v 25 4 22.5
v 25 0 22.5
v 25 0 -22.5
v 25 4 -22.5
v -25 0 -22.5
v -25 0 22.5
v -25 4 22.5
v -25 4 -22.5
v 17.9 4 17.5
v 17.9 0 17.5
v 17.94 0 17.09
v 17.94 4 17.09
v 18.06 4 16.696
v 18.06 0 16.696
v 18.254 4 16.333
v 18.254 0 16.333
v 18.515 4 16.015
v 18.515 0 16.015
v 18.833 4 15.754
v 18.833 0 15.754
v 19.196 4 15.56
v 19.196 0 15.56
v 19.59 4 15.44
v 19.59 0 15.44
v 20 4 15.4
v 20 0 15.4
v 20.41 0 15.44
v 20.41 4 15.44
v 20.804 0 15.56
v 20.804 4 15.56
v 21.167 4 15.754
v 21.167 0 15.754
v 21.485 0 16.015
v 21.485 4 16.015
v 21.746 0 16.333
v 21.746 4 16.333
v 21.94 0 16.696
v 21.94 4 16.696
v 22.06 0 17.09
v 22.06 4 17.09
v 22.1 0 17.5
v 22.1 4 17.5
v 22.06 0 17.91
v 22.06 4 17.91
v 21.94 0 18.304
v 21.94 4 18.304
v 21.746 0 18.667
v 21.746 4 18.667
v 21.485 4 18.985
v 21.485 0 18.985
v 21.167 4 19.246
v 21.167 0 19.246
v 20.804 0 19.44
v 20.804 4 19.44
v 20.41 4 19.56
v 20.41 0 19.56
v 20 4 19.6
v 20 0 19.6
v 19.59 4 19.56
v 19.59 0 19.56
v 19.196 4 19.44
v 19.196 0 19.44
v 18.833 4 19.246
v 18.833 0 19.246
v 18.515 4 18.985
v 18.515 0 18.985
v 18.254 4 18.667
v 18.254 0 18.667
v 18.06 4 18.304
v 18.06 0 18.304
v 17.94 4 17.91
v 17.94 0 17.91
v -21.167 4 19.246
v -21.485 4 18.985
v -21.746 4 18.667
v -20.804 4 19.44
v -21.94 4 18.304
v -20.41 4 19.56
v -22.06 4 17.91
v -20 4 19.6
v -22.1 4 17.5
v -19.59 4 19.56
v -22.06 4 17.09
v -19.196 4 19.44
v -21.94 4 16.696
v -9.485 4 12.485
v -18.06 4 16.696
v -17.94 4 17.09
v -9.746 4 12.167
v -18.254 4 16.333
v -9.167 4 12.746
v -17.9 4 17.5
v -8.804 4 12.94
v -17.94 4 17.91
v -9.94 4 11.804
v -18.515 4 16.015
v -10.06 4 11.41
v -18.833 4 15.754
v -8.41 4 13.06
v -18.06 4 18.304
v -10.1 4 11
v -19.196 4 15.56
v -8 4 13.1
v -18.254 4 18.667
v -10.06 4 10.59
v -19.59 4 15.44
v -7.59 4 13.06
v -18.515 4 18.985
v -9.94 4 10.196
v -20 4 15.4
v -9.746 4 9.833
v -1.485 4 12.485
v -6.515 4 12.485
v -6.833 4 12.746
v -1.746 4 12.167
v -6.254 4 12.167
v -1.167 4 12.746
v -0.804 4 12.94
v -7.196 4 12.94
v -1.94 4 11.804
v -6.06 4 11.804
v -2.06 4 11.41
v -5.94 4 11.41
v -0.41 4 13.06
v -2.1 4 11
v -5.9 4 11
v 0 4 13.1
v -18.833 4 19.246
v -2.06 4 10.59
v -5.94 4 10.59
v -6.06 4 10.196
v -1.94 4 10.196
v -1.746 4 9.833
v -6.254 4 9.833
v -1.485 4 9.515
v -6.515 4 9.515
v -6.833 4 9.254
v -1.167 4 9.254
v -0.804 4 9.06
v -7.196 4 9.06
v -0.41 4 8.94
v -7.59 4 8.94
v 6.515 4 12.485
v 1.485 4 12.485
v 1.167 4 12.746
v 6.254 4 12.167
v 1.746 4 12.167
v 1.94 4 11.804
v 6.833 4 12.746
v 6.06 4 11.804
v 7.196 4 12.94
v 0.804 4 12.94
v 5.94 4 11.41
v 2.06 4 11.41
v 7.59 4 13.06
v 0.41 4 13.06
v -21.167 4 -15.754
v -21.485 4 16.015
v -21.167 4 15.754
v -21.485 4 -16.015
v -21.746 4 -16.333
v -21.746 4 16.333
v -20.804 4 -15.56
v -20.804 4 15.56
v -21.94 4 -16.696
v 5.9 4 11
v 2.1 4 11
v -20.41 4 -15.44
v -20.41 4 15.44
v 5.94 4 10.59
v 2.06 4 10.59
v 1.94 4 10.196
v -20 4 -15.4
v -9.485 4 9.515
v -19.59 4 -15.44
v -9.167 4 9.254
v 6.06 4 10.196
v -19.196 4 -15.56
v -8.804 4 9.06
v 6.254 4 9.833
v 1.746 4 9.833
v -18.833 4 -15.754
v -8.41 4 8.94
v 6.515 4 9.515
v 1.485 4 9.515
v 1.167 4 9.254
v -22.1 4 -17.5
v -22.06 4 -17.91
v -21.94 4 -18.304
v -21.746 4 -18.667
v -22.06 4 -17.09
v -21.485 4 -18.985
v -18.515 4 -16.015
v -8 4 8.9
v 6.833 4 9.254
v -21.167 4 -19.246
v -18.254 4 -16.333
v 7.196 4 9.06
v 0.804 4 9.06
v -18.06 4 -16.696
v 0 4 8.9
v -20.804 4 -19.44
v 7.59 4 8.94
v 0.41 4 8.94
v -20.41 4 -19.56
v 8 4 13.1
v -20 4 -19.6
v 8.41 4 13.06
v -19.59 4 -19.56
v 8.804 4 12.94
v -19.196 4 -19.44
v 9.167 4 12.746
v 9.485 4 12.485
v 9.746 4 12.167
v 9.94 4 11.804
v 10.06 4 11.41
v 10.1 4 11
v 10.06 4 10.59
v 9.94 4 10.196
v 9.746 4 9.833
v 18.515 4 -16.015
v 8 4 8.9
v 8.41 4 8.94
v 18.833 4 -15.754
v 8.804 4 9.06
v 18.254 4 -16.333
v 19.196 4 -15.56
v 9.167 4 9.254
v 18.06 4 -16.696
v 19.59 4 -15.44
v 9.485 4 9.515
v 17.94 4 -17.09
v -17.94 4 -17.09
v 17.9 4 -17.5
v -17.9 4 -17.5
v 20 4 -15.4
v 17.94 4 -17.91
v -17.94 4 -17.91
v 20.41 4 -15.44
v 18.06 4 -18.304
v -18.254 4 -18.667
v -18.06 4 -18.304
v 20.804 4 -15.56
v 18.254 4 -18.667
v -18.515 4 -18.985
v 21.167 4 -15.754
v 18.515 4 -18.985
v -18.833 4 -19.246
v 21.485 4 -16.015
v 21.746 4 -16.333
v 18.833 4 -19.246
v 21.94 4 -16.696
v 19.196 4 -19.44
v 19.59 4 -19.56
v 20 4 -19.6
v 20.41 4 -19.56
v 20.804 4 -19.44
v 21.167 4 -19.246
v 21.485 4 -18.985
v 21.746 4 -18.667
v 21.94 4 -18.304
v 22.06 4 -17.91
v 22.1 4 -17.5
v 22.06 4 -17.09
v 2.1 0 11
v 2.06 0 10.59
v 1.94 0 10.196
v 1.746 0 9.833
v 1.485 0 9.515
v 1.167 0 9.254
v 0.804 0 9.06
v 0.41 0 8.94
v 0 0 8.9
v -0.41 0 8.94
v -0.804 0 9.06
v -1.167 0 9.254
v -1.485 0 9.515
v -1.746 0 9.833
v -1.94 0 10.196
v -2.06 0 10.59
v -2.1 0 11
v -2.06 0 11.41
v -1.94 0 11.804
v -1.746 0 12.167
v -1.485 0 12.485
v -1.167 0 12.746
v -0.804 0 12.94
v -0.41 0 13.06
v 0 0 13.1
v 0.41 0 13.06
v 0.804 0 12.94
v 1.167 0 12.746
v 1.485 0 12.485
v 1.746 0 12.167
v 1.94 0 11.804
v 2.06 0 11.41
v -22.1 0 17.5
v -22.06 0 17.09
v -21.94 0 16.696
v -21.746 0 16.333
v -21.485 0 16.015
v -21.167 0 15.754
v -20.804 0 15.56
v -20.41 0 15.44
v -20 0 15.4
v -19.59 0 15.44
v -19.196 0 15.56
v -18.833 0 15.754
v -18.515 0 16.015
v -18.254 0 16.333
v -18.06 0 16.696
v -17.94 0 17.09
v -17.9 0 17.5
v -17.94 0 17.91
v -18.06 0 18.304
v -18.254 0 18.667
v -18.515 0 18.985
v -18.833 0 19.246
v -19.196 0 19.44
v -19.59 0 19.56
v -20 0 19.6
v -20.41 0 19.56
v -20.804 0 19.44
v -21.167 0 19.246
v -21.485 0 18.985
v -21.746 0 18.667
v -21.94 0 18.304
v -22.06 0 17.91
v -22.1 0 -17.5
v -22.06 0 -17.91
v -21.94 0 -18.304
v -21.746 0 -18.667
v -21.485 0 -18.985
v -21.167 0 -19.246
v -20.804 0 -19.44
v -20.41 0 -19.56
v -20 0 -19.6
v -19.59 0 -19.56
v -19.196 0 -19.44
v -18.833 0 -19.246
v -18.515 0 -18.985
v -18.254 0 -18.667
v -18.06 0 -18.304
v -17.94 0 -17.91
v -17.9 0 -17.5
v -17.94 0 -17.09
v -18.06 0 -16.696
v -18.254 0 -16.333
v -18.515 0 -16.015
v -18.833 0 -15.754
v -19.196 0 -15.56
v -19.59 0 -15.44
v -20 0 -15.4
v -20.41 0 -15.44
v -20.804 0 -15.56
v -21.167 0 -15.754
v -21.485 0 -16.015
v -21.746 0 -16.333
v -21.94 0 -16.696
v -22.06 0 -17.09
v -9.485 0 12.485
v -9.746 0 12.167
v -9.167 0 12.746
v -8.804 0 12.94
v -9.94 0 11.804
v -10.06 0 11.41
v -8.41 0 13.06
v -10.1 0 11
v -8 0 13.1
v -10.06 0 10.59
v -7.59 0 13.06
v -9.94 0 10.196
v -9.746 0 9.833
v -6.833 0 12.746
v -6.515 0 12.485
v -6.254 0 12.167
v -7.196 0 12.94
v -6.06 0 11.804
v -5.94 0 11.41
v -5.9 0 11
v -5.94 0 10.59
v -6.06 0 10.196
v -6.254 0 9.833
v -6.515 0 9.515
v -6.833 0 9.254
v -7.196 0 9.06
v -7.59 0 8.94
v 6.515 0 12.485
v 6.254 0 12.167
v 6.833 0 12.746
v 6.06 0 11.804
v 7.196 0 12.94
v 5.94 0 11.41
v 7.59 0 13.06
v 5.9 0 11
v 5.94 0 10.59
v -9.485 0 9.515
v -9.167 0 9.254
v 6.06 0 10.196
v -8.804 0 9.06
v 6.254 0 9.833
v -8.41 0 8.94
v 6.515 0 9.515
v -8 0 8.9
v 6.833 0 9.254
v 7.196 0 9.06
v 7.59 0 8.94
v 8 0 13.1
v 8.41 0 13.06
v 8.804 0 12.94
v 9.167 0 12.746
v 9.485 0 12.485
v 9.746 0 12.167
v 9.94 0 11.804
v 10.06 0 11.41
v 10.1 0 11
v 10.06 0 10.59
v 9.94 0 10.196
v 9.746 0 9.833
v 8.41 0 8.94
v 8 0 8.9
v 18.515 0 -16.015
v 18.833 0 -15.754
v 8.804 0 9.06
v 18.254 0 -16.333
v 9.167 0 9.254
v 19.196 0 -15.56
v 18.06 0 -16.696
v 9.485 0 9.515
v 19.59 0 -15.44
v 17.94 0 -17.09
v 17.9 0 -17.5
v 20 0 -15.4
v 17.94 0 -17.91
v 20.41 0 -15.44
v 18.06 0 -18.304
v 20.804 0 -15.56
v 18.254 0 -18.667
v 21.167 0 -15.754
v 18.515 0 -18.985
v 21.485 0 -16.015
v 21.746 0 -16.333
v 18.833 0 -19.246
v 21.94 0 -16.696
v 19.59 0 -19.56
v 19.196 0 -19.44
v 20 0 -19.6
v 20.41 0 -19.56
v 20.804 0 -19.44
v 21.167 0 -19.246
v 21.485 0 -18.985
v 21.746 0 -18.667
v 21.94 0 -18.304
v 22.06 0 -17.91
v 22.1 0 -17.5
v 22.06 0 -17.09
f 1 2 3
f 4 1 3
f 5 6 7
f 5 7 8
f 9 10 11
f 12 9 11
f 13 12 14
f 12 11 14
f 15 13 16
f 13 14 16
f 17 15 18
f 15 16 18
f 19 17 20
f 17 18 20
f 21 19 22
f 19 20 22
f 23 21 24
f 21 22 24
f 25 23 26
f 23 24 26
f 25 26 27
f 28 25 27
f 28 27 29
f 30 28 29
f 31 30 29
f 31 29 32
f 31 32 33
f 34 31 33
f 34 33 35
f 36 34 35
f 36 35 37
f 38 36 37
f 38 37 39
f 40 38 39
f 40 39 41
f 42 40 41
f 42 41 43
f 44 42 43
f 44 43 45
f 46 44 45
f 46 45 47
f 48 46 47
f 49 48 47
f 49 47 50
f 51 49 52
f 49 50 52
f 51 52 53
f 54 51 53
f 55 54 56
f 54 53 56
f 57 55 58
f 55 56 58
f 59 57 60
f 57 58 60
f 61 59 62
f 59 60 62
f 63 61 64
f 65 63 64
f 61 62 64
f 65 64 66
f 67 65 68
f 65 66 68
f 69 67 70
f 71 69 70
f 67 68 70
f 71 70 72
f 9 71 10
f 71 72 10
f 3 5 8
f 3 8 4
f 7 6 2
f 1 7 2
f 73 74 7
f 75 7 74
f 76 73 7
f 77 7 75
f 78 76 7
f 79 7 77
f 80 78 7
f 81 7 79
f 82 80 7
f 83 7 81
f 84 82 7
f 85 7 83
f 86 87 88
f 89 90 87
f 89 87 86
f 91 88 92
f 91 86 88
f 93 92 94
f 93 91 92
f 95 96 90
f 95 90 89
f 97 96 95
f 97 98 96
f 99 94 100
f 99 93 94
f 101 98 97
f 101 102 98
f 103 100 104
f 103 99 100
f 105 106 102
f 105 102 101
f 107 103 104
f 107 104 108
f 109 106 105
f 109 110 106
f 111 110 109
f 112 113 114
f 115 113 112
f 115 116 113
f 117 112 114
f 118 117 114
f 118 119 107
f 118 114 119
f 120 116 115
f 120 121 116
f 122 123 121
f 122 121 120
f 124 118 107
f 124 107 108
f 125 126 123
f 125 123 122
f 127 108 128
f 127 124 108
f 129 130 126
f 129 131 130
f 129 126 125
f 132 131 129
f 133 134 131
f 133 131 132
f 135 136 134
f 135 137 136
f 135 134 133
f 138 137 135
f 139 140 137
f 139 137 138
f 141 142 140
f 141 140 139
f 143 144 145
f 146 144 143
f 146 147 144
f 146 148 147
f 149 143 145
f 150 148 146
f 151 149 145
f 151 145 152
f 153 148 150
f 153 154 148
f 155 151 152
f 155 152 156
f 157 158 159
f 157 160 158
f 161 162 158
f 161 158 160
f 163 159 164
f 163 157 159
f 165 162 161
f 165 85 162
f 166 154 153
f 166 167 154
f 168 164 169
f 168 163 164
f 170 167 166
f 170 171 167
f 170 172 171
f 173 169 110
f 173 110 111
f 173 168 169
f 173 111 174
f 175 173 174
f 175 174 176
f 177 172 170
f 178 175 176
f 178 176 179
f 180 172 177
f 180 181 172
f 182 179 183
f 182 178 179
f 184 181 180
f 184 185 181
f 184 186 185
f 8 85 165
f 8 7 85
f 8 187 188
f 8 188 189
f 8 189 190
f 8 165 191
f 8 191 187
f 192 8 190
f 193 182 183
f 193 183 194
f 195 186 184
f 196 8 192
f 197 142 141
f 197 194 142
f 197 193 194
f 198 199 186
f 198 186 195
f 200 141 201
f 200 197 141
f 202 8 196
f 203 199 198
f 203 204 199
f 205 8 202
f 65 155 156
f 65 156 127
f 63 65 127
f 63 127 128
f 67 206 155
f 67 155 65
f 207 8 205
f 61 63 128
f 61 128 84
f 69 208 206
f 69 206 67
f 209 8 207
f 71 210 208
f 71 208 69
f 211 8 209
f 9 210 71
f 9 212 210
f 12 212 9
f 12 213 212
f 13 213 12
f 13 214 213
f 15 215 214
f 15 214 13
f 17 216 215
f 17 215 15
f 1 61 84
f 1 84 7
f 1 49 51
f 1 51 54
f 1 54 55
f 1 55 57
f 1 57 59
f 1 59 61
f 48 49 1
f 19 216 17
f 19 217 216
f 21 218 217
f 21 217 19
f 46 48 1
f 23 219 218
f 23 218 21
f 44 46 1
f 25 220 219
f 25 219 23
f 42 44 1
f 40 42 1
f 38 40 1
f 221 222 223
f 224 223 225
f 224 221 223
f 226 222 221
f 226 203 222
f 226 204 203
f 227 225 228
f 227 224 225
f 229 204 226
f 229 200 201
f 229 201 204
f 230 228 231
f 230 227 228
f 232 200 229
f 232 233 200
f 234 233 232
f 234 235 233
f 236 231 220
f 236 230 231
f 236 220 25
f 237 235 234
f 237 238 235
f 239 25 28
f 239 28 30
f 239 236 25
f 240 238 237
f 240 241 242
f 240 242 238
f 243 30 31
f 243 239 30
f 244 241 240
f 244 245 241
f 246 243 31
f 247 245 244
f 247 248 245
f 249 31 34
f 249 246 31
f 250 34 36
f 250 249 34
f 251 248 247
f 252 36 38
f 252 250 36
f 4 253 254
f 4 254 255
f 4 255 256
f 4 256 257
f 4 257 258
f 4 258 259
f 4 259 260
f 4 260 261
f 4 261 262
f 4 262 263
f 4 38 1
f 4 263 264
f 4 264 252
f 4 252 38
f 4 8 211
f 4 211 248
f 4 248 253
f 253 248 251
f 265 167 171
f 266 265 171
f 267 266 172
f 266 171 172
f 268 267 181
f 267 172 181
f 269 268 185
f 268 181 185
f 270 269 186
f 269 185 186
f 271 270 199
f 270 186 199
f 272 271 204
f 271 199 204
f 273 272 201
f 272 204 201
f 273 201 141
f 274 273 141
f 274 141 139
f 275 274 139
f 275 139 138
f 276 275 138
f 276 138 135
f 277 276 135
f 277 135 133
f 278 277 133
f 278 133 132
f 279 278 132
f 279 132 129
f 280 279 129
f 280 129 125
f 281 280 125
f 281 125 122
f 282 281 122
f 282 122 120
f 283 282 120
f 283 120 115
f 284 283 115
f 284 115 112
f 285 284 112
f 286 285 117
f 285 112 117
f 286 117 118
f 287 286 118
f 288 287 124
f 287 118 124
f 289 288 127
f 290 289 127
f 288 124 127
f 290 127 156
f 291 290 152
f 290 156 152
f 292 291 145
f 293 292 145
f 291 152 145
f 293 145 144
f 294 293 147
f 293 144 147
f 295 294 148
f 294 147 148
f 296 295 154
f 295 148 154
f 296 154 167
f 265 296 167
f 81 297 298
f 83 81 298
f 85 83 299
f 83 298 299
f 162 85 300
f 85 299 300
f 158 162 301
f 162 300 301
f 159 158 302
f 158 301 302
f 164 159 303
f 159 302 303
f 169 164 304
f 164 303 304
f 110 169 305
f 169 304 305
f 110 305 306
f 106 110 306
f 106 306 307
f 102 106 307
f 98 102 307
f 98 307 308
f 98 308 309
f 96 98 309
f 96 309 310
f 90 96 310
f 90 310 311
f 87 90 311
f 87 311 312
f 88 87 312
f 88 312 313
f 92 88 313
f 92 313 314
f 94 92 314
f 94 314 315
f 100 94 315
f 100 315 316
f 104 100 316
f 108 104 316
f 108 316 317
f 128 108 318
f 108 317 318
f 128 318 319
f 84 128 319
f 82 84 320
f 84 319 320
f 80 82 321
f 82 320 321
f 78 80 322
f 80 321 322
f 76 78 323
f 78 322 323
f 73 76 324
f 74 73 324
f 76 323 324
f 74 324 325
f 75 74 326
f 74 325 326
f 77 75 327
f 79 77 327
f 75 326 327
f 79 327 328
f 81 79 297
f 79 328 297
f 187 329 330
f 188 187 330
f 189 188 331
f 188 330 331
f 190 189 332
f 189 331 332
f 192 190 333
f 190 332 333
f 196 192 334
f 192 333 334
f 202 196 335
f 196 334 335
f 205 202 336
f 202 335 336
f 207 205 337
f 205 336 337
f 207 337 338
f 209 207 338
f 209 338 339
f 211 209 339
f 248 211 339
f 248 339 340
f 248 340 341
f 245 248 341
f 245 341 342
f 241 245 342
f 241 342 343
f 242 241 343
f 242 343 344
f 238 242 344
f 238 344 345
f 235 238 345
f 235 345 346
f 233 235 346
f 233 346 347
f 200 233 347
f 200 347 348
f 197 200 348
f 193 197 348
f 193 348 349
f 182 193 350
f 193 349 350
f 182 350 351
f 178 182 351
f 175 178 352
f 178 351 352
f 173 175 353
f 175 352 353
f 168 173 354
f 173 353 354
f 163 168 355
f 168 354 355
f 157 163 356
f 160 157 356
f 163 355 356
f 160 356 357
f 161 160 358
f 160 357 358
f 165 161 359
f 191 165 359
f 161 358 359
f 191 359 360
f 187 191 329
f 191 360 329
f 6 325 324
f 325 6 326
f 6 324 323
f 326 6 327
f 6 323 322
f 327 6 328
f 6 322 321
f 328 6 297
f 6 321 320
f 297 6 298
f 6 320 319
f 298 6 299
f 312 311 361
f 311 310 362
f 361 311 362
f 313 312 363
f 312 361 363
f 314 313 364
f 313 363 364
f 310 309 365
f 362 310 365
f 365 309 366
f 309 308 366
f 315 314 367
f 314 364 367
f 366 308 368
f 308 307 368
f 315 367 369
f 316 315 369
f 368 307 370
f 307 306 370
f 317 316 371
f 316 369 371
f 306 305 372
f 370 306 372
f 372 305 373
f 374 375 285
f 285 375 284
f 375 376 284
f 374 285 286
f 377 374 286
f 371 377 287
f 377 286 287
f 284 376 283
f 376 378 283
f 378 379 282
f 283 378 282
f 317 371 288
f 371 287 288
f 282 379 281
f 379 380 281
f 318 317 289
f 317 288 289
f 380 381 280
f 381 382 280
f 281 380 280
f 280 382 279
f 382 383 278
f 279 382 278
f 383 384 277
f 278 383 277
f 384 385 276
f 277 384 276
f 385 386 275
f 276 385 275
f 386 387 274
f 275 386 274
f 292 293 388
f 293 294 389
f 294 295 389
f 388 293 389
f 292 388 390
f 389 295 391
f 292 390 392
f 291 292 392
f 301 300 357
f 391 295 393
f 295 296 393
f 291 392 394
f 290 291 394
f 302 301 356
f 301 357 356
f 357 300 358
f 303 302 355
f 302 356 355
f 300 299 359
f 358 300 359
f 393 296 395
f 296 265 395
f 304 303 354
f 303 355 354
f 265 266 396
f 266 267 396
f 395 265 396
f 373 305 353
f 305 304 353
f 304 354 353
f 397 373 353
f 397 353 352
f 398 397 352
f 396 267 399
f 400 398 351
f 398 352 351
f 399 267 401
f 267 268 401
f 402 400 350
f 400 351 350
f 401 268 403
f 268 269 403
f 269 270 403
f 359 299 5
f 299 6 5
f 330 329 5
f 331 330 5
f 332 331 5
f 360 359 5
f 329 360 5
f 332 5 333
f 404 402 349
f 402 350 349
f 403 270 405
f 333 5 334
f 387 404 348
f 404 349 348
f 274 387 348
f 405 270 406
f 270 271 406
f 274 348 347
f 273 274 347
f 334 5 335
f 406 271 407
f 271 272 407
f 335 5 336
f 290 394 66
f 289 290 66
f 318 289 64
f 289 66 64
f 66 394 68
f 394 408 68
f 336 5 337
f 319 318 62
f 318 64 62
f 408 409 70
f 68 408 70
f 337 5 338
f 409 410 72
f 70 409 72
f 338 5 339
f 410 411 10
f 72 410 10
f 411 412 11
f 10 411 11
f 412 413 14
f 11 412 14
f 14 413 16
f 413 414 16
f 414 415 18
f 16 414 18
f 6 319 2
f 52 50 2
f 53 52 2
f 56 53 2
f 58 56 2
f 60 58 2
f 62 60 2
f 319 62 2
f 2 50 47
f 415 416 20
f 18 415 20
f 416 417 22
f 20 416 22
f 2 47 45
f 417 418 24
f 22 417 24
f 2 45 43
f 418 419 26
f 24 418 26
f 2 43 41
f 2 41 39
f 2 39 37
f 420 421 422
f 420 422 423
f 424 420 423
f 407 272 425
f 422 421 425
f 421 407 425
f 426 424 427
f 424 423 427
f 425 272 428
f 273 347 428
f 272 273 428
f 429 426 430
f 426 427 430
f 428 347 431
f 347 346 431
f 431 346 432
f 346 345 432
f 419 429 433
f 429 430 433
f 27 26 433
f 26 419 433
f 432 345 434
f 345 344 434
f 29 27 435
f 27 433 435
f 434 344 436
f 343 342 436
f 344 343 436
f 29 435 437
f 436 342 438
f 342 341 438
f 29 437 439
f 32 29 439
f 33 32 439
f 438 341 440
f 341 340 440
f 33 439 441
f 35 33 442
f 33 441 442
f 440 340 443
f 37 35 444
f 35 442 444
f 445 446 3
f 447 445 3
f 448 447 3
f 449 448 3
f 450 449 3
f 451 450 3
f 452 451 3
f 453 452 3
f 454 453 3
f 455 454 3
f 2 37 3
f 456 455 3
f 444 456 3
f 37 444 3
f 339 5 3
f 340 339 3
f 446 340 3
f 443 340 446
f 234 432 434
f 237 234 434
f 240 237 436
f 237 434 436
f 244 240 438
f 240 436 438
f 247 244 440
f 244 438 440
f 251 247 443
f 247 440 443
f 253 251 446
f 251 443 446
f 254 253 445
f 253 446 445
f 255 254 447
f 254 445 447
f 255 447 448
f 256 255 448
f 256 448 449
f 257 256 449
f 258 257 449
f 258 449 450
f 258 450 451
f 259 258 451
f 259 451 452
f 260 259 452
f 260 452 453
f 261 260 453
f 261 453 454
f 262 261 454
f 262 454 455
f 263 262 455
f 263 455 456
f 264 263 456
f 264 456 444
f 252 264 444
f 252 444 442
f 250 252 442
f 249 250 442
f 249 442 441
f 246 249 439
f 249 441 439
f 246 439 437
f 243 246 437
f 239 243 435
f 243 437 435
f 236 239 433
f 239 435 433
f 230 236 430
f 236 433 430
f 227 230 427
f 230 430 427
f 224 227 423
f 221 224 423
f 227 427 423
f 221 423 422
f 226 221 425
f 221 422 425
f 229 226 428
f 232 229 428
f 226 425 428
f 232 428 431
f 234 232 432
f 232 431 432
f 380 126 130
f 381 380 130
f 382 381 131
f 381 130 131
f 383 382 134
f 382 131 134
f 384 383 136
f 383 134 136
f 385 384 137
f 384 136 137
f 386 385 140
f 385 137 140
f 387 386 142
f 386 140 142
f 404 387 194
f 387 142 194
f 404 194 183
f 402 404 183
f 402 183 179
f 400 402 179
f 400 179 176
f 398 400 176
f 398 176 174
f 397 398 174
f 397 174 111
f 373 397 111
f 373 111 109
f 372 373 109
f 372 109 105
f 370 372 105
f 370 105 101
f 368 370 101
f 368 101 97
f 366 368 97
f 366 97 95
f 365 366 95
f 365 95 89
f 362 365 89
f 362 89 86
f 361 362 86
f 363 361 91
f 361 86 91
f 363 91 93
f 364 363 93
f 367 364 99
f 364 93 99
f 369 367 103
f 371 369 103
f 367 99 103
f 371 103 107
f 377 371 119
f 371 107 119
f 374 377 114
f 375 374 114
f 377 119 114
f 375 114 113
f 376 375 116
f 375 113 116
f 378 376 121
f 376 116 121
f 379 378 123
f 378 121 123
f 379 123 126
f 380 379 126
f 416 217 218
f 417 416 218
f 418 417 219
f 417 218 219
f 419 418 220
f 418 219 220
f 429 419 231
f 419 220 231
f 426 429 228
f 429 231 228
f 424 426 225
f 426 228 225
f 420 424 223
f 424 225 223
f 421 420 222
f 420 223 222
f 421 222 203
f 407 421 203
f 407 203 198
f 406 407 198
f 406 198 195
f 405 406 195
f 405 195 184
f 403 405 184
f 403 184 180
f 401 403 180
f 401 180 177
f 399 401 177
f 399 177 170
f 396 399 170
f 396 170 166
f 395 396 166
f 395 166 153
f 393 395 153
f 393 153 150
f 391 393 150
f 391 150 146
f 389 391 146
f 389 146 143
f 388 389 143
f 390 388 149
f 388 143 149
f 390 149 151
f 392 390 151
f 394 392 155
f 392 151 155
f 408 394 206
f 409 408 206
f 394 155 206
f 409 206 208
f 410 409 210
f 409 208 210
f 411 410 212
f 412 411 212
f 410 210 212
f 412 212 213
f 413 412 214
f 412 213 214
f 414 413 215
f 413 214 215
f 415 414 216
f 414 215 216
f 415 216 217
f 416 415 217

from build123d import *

# Parameters (mm, degrees)
SKETCH_1_W          = 50
SKETCH_1_H          = 45
EXTRUDE_1_DEPTH     = 4
SKETCH_2_R          = 2.1
CUT_EXTRUDE_1_DEPTH = 5
SKETCH_5_R          = 2.1
CUT_EXTRUDE_4_DEPTH = 5


with BuildPart() as part:
    # 草图1 → 凸台-拉伸1 (new body)
    with BuildSketch(Plane(origin=(0, 0, 0), x_dir=(1, 0, 0), z_dir=(0, 1, 0))):
        Rectangle(SKETCH_1_W, SKETCH_1_H)
    extrude(amount=EXTRUDE_1_DEPTH)

    # 草图2 → 切除-拉伸1 (cut, through all)
    with BuildSketch(Plane(origin=(0, 4, 0), x_dir=(1, 0, 0), z_dir=(0, 1, 0))):
        with Locations((0, -11)):
            Circle(SKETCH_2_R)
        with Locations((8, -11)):
            Circle(SKETCH_2_R)
        with Locations((-8, -11)):
            Circle(SKETCH_2_R)
    extrude(amount=-CUT_EXTRUDE_1_DEPTH, mode=Mode.SUBTRACT)

    # 草图5 → 切除-拉伸4 (cut, through all)
    with BuildSketch(Plane(origin=(0, 0, 0), x_dir=(-1, 0, 0), z_dir=(0, -1, 0))):
        with Locations((20, -17.5)):
            Circle(SKETCH_5_R)
        with Locations((20, 17.5)):
            Circle(SKETCH_5_R)
        with Locations((-20, 17.5)):
            Circle(SKETCH_5_R)
        with Locations((-20, -17.5)):
            Circle(SKETCH_5_R)
    extrude(amount=-CUT_EXTRUDE_4_DEPTH, mode=Mode.SUBTRACT)


solid = part.part
